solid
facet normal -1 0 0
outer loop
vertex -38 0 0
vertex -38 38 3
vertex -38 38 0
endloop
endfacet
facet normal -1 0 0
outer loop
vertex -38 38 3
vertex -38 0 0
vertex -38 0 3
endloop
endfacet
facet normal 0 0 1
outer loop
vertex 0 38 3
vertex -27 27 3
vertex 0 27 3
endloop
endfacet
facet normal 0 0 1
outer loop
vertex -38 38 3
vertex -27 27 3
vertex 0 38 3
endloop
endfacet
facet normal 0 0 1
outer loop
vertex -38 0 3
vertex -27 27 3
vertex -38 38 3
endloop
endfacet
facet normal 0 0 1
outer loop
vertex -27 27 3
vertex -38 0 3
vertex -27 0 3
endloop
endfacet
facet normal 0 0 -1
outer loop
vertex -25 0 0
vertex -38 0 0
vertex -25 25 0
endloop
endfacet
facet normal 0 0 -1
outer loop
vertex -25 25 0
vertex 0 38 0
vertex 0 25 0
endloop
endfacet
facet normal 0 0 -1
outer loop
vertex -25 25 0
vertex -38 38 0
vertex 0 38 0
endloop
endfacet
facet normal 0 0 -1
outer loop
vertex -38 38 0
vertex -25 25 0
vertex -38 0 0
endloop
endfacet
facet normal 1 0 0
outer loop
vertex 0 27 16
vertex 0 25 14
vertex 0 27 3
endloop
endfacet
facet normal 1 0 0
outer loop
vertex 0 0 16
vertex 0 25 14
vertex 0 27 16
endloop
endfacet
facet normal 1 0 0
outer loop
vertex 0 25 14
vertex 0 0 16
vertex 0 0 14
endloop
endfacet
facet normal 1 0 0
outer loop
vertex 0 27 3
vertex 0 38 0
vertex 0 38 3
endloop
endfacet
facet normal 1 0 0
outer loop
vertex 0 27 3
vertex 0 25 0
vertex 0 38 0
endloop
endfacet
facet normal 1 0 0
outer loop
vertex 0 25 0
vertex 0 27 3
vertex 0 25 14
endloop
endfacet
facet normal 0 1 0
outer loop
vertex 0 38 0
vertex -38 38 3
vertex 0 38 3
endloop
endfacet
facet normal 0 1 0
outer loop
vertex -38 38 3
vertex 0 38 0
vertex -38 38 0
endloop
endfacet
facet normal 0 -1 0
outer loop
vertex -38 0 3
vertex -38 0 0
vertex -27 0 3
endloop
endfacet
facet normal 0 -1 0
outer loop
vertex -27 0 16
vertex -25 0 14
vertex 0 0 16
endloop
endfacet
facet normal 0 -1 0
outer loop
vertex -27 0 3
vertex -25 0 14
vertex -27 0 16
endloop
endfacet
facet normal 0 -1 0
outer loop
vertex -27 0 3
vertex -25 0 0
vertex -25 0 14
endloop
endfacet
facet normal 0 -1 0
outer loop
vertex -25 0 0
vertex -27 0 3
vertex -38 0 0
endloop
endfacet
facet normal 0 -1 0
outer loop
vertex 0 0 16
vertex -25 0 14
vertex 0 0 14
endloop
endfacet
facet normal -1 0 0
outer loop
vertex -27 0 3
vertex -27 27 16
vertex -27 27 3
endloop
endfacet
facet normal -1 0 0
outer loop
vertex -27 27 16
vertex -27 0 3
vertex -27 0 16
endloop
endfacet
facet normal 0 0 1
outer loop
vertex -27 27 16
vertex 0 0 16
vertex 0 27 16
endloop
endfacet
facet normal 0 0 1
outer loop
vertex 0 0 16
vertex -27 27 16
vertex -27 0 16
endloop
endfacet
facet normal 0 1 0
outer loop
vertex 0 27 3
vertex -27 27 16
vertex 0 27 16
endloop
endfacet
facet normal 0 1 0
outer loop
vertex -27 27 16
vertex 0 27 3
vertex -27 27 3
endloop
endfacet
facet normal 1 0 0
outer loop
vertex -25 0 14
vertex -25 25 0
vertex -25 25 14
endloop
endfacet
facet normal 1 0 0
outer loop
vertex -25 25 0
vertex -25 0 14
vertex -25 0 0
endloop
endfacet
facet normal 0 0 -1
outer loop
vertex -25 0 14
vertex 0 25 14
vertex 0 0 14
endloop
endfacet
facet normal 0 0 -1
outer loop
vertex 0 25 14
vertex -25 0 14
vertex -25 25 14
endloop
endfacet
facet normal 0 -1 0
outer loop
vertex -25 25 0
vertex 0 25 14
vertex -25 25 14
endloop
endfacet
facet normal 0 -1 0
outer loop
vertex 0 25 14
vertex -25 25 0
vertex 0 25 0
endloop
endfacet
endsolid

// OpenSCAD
mirror () {
difference () {
union () {
   cube([38,38,3]);
    cube([27,27,16]);
    }
cube([25,25,14]);}}
